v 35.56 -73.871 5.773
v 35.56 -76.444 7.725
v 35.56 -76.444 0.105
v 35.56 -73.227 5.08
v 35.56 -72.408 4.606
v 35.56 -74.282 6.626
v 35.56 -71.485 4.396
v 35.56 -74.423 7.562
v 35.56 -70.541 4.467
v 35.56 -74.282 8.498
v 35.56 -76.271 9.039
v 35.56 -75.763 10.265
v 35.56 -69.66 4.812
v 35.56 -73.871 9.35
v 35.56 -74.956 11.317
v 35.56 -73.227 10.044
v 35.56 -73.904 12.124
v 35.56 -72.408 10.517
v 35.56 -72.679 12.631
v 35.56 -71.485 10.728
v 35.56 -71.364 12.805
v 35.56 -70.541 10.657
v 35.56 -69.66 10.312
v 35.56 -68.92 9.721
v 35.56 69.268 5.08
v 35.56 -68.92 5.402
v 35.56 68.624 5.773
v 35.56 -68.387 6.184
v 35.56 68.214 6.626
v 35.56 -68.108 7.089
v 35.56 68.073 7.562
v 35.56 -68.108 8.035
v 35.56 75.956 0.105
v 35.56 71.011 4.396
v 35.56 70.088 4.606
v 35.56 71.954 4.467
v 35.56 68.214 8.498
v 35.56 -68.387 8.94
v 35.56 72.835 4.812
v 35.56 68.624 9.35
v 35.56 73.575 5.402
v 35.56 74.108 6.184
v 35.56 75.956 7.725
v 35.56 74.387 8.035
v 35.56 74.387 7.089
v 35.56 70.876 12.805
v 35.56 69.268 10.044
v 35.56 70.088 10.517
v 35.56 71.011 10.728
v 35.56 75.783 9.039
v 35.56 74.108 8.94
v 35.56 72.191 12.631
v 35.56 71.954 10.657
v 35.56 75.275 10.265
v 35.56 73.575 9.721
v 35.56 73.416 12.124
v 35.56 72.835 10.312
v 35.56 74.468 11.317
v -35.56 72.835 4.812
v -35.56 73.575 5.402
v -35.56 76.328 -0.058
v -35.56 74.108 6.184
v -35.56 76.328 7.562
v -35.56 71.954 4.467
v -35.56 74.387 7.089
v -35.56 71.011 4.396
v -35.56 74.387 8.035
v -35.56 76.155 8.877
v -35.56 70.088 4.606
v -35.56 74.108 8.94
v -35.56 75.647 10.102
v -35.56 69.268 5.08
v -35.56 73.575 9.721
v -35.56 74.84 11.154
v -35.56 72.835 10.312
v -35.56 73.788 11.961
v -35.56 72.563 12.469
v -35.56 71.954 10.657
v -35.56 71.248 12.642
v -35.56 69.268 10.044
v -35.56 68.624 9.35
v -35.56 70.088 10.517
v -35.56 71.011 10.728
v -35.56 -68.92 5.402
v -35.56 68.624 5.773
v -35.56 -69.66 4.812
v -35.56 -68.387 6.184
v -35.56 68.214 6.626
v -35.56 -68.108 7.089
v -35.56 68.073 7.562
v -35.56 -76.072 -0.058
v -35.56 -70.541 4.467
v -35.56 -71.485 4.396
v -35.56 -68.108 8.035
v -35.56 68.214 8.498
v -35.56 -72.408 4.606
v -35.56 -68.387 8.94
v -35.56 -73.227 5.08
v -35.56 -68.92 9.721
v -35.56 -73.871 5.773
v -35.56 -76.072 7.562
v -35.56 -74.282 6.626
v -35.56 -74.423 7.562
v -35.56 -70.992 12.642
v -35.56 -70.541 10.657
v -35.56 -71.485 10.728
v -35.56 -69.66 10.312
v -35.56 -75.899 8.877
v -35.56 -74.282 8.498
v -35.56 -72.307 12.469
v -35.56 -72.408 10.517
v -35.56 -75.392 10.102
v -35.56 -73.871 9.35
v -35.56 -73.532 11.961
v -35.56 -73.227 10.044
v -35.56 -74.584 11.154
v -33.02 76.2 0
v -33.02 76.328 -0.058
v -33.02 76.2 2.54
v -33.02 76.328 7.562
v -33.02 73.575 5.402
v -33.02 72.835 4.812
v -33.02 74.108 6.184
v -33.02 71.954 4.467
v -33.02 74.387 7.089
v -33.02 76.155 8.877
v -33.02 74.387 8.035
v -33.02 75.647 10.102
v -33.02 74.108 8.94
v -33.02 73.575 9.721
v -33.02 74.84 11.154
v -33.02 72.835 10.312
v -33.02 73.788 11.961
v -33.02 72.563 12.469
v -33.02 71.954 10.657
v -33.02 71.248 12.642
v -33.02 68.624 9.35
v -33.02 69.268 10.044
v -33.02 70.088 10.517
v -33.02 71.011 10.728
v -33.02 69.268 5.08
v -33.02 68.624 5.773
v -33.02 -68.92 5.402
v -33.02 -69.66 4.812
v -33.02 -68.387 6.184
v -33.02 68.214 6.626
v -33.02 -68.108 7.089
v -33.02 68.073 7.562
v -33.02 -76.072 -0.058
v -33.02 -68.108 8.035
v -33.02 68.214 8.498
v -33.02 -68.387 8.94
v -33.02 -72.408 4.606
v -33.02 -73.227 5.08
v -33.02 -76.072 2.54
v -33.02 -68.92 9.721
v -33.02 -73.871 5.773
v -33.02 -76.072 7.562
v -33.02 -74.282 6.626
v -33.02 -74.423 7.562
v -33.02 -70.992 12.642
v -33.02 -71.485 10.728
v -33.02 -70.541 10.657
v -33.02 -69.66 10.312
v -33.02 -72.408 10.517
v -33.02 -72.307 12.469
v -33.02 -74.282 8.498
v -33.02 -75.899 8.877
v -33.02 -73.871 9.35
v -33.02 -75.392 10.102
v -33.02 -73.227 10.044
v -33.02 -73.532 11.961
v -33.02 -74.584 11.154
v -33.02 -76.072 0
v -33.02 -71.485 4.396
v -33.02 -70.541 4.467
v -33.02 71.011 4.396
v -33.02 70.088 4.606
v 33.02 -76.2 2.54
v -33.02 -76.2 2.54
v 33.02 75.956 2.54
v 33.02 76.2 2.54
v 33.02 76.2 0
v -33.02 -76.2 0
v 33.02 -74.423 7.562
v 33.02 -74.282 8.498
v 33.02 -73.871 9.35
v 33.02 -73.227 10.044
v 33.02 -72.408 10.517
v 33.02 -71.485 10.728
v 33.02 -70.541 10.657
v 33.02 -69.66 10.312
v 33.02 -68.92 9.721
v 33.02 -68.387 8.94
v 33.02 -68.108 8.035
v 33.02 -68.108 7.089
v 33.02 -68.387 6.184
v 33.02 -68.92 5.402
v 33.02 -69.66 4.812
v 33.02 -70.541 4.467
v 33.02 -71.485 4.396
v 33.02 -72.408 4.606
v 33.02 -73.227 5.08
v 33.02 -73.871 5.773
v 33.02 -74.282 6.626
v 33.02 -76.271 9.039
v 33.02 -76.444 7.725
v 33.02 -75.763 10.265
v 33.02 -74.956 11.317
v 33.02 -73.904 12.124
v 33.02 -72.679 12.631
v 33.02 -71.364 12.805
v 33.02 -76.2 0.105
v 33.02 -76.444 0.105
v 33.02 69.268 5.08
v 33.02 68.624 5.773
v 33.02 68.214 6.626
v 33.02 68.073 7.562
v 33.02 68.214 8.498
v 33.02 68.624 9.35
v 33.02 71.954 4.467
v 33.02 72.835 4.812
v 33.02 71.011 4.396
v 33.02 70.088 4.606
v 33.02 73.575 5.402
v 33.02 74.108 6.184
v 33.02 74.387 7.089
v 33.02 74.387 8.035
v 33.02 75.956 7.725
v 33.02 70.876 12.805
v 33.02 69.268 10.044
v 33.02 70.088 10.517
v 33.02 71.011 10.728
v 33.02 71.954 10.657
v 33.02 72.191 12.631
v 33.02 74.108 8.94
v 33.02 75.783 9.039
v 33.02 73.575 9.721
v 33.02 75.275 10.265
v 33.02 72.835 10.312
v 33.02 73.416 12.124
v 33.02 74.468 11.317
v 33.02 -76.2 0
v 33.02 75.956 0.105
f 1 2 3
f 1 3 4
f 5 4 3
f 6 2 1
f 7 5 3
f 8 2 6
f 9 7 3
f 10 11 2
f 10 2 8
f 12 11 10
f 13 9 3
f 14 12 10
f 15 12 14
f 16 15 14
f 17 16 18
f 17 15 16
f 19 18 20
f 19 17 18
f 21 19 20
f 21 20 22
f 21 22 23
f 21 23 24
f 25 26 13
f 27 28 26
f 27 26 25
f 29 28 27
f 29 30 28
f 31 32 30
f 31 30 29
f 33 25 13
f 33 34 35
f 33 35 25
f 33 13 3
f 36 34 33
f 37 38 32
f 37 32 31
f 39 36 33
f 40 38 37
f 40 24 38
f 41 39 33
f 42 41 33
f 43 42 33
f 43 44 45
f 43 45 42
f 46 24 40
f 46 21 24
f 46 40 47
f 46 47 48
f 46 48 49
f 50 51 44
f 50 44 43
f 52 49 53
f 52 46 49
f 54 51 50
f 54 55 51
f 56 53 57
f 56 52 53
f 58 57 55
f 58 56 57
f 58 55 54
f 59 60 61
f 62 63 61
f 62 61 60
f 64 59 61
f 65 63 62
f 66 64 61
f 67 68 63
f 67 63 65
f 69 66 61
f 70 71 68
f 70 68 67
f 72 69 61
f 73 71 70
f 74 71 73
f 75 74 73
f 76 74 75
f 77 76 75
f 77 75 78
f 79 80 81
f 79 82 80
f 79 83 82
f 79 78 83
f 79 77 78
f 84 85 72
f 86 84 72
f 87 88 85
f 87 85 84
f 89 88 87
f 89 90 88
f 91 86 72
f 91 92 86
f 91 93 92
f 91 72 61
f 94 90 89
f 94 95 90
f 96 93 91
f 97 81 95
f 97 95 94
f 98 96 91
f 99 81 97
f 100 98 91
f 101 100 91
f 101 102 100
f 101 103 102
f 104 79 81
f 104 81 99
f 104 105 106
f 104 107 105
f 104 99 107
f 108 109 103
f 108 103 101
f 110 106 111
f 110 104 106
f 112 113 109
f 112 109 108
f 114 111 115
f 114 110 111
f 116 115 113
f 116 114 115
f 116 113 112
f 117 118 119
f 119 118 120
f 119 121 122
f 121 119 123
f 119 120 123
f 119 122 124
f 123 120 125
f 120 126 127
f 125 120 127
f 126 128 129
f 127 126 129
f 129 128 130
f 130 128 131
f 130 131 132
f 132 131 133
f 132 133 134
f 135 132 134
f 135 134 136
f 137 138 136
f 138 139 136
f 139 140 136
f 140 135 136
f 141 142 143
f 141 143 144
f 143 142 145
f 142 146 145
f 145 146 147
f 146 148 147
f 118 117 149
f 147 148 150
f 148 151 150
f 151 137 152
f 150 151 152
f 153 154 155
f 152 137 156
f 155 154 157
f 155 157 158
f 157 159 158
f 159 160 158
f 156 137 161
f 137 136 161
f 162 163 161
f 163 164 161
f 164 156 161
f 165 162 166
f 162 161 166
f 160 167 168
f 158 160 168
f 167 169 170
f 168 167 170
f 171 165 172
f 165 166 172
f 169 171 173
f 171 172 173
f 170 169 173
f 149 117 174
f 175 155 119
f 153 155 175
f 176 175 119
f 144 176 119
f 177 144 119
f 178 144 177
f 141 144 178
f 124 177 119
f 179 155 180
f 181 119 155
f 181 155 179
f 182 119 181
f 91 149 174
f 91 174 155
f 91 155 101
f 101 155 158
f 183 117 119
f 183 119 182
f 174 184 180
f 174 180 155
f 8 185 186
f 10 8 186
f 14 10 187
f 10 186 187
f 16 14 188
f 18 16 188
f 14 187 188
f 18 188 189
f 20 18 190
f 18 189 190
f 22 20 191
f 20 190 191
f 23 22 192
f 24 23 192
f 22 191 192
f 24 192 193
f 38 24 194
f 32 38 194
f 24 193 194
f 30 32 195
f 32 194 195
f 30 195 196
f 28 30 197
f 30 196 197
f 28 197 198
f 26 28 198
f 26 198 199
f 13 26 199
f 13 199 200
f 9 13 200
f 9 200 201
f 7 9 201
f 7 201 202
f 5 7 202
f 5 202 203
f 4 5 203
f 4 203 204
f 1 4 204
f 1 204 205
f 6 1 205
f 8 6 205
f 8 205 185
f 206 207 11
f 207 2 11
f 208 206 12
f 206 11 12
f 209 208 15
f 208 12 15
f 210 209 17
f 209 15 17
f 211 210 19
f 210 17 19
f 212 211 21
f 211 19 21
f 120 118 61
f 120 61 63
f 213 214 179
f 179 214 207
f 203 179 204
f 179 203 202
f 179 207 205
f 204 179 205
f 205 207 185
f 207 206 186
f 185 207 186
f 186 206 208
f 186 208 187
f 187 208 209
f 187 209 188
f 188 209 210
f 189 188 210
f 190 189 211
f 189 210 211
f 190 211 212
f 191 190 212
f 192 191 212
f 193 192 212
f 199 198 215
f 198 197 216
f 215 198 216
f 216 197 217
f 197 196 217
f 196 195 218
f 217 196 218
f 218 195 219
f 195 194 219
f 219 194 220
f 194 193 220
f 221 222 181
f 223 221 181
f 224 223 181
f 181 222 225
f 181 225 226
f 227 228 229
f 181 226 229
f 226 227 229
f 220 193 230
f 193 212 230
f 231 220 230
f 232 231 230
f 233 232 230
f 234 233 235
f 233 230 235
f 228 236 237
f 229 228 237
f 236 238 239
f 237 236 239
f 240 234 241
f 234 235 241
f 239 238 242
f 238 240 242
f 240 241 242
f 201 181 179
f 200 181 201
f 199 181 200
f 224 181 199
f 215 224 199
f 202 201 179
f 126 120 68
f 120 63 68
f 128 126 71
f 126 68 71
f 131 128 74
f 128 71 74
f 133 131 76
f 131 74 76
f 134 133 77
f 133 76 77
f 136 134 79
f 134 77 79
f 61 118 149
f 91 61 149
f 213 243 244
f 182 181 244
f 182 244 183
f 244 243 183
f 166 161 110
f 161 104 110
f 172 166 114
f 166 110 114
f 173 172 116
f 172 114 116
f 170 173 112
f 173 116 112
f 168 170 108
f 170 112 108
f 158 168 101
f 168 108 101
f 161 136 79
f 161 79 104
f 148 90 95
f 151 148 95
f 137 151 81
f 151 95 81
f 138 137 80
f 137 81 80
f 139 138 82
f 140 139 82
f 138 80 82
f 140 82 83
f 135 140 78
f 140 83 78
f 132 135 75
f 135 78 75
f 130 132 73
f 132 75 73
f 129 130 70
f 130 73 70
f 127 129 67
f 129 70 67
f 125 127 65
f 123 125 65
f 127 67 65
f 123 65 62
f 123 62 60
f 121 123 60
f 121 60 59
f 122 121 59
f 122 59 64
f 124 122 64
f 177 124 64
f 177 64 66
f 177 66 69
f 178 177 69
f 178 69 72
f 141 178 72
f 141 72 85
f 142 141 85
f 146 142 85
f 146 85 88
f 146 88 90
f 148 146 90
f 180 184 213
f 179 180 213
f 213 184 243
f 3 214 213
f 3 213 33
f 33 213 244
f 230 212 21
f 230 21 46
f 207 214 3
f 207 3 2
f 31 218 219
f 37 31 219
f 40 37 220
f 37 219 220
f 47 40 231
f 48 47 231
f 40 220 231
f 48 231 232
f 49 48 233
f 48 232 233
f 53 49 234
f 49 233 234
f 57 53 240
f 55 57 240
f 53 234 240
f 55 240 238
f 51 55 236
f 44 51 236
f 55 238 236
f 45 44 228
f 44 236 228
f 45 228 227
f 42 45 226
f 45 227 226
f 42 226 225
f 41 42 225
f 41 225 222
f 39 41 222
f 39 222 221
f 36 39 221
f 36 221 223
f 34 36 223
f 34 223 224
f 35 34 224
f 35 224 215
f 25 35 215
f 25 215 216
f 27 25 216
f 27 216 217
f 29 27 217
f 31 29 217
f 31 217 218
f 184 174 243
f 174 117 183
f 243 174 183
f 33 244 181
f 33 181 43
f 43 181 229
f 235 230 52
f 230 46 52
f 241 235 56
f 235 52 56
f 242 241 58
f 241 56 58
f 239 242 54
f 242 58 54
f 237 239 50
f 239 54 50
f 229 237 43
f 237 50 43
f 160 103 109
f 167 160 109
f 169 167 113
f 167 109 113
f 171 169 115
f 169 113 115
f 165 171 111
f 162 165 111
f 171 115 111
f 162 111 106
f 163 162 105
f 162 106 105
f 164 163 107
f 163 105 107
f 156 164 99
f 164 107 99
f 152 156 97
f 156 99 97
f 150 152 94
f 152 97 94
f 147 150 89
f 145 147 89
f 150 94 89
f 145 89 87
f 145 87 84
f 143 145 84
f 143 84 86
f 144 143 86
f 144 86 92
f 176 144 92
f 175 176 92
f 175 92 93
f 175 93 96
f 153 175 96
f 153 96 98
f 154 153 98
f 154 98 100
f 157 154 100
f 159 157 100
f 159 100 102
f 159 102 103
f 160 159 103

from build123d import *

# Parameters (mm, degrees)
F0_W     = 66.04
F0_H     = 152.4
F1_DEPTH = 2.54
F2_W     = 152.4
F2_H     = 12.7
F3_DEPTH = 2.54
F4_W     = 152.4
F4_H     = 12.7
F5_DEPTH = 2.54
F6_R     = 5.08
F7_R     = 3.175
F8_DEPTH = 90.17


with BuildPart() as f1:
    # F0 (on Top) → F1 (new body)
    with BuildSketch(Plane.XY):
        Rectangle(F0_W, F0_H)
    extrude(amount=F1_DEPTH)

    # F2 (on face) → F3 (join)
    with BuildSketch(Plane.YZ.offset(33.02)):
        with Locations((-0.243933, 6.454543)):
            Rectangle(F2_W, F2_H)
    extrude(amount=F3_DEPTH)

    # F4 (on face) → F5 (join)
    with BuildSketch(Plane(origin=(-33.02, 0, 0), x_dir=(0, -1, 0), z_dir=(-1, 0, 0))):
        with Locations((-0.127775, 6.291921)):
            Rectangle(F4_W, F4_H)
    extrude(amount=F5_DEPTH)

    # F6
    f6_edges = [f1.edges().sort_by_distance(p)[0] for p in [
        (34.29, -76.443933, 12.804543),
        (-34.29, -76.072225, 12.641921),
        (34.29, 75.956067, 12.804543),
        (-34.29, 76.327775, 12.641921),
    ]]
    fillet(f6_edges, radius=F6_R)

    # F7 (on face) → F8 (cut)
    with BuildSketch(Plane(origin=(-35.56, 0, 0), x_dir=(0, -1, 0), z_dir=(-1, 0, 0))):
        with Locations((-71.247775, 7.561921)):
            Circle(F7_R)
        with Locations((71.247775, 7.561921)):
            Circle(F7_R)
    extrude(amount=-F8_DEPTH, mode=Mode.SUBTRACT)


solid = f1.part
